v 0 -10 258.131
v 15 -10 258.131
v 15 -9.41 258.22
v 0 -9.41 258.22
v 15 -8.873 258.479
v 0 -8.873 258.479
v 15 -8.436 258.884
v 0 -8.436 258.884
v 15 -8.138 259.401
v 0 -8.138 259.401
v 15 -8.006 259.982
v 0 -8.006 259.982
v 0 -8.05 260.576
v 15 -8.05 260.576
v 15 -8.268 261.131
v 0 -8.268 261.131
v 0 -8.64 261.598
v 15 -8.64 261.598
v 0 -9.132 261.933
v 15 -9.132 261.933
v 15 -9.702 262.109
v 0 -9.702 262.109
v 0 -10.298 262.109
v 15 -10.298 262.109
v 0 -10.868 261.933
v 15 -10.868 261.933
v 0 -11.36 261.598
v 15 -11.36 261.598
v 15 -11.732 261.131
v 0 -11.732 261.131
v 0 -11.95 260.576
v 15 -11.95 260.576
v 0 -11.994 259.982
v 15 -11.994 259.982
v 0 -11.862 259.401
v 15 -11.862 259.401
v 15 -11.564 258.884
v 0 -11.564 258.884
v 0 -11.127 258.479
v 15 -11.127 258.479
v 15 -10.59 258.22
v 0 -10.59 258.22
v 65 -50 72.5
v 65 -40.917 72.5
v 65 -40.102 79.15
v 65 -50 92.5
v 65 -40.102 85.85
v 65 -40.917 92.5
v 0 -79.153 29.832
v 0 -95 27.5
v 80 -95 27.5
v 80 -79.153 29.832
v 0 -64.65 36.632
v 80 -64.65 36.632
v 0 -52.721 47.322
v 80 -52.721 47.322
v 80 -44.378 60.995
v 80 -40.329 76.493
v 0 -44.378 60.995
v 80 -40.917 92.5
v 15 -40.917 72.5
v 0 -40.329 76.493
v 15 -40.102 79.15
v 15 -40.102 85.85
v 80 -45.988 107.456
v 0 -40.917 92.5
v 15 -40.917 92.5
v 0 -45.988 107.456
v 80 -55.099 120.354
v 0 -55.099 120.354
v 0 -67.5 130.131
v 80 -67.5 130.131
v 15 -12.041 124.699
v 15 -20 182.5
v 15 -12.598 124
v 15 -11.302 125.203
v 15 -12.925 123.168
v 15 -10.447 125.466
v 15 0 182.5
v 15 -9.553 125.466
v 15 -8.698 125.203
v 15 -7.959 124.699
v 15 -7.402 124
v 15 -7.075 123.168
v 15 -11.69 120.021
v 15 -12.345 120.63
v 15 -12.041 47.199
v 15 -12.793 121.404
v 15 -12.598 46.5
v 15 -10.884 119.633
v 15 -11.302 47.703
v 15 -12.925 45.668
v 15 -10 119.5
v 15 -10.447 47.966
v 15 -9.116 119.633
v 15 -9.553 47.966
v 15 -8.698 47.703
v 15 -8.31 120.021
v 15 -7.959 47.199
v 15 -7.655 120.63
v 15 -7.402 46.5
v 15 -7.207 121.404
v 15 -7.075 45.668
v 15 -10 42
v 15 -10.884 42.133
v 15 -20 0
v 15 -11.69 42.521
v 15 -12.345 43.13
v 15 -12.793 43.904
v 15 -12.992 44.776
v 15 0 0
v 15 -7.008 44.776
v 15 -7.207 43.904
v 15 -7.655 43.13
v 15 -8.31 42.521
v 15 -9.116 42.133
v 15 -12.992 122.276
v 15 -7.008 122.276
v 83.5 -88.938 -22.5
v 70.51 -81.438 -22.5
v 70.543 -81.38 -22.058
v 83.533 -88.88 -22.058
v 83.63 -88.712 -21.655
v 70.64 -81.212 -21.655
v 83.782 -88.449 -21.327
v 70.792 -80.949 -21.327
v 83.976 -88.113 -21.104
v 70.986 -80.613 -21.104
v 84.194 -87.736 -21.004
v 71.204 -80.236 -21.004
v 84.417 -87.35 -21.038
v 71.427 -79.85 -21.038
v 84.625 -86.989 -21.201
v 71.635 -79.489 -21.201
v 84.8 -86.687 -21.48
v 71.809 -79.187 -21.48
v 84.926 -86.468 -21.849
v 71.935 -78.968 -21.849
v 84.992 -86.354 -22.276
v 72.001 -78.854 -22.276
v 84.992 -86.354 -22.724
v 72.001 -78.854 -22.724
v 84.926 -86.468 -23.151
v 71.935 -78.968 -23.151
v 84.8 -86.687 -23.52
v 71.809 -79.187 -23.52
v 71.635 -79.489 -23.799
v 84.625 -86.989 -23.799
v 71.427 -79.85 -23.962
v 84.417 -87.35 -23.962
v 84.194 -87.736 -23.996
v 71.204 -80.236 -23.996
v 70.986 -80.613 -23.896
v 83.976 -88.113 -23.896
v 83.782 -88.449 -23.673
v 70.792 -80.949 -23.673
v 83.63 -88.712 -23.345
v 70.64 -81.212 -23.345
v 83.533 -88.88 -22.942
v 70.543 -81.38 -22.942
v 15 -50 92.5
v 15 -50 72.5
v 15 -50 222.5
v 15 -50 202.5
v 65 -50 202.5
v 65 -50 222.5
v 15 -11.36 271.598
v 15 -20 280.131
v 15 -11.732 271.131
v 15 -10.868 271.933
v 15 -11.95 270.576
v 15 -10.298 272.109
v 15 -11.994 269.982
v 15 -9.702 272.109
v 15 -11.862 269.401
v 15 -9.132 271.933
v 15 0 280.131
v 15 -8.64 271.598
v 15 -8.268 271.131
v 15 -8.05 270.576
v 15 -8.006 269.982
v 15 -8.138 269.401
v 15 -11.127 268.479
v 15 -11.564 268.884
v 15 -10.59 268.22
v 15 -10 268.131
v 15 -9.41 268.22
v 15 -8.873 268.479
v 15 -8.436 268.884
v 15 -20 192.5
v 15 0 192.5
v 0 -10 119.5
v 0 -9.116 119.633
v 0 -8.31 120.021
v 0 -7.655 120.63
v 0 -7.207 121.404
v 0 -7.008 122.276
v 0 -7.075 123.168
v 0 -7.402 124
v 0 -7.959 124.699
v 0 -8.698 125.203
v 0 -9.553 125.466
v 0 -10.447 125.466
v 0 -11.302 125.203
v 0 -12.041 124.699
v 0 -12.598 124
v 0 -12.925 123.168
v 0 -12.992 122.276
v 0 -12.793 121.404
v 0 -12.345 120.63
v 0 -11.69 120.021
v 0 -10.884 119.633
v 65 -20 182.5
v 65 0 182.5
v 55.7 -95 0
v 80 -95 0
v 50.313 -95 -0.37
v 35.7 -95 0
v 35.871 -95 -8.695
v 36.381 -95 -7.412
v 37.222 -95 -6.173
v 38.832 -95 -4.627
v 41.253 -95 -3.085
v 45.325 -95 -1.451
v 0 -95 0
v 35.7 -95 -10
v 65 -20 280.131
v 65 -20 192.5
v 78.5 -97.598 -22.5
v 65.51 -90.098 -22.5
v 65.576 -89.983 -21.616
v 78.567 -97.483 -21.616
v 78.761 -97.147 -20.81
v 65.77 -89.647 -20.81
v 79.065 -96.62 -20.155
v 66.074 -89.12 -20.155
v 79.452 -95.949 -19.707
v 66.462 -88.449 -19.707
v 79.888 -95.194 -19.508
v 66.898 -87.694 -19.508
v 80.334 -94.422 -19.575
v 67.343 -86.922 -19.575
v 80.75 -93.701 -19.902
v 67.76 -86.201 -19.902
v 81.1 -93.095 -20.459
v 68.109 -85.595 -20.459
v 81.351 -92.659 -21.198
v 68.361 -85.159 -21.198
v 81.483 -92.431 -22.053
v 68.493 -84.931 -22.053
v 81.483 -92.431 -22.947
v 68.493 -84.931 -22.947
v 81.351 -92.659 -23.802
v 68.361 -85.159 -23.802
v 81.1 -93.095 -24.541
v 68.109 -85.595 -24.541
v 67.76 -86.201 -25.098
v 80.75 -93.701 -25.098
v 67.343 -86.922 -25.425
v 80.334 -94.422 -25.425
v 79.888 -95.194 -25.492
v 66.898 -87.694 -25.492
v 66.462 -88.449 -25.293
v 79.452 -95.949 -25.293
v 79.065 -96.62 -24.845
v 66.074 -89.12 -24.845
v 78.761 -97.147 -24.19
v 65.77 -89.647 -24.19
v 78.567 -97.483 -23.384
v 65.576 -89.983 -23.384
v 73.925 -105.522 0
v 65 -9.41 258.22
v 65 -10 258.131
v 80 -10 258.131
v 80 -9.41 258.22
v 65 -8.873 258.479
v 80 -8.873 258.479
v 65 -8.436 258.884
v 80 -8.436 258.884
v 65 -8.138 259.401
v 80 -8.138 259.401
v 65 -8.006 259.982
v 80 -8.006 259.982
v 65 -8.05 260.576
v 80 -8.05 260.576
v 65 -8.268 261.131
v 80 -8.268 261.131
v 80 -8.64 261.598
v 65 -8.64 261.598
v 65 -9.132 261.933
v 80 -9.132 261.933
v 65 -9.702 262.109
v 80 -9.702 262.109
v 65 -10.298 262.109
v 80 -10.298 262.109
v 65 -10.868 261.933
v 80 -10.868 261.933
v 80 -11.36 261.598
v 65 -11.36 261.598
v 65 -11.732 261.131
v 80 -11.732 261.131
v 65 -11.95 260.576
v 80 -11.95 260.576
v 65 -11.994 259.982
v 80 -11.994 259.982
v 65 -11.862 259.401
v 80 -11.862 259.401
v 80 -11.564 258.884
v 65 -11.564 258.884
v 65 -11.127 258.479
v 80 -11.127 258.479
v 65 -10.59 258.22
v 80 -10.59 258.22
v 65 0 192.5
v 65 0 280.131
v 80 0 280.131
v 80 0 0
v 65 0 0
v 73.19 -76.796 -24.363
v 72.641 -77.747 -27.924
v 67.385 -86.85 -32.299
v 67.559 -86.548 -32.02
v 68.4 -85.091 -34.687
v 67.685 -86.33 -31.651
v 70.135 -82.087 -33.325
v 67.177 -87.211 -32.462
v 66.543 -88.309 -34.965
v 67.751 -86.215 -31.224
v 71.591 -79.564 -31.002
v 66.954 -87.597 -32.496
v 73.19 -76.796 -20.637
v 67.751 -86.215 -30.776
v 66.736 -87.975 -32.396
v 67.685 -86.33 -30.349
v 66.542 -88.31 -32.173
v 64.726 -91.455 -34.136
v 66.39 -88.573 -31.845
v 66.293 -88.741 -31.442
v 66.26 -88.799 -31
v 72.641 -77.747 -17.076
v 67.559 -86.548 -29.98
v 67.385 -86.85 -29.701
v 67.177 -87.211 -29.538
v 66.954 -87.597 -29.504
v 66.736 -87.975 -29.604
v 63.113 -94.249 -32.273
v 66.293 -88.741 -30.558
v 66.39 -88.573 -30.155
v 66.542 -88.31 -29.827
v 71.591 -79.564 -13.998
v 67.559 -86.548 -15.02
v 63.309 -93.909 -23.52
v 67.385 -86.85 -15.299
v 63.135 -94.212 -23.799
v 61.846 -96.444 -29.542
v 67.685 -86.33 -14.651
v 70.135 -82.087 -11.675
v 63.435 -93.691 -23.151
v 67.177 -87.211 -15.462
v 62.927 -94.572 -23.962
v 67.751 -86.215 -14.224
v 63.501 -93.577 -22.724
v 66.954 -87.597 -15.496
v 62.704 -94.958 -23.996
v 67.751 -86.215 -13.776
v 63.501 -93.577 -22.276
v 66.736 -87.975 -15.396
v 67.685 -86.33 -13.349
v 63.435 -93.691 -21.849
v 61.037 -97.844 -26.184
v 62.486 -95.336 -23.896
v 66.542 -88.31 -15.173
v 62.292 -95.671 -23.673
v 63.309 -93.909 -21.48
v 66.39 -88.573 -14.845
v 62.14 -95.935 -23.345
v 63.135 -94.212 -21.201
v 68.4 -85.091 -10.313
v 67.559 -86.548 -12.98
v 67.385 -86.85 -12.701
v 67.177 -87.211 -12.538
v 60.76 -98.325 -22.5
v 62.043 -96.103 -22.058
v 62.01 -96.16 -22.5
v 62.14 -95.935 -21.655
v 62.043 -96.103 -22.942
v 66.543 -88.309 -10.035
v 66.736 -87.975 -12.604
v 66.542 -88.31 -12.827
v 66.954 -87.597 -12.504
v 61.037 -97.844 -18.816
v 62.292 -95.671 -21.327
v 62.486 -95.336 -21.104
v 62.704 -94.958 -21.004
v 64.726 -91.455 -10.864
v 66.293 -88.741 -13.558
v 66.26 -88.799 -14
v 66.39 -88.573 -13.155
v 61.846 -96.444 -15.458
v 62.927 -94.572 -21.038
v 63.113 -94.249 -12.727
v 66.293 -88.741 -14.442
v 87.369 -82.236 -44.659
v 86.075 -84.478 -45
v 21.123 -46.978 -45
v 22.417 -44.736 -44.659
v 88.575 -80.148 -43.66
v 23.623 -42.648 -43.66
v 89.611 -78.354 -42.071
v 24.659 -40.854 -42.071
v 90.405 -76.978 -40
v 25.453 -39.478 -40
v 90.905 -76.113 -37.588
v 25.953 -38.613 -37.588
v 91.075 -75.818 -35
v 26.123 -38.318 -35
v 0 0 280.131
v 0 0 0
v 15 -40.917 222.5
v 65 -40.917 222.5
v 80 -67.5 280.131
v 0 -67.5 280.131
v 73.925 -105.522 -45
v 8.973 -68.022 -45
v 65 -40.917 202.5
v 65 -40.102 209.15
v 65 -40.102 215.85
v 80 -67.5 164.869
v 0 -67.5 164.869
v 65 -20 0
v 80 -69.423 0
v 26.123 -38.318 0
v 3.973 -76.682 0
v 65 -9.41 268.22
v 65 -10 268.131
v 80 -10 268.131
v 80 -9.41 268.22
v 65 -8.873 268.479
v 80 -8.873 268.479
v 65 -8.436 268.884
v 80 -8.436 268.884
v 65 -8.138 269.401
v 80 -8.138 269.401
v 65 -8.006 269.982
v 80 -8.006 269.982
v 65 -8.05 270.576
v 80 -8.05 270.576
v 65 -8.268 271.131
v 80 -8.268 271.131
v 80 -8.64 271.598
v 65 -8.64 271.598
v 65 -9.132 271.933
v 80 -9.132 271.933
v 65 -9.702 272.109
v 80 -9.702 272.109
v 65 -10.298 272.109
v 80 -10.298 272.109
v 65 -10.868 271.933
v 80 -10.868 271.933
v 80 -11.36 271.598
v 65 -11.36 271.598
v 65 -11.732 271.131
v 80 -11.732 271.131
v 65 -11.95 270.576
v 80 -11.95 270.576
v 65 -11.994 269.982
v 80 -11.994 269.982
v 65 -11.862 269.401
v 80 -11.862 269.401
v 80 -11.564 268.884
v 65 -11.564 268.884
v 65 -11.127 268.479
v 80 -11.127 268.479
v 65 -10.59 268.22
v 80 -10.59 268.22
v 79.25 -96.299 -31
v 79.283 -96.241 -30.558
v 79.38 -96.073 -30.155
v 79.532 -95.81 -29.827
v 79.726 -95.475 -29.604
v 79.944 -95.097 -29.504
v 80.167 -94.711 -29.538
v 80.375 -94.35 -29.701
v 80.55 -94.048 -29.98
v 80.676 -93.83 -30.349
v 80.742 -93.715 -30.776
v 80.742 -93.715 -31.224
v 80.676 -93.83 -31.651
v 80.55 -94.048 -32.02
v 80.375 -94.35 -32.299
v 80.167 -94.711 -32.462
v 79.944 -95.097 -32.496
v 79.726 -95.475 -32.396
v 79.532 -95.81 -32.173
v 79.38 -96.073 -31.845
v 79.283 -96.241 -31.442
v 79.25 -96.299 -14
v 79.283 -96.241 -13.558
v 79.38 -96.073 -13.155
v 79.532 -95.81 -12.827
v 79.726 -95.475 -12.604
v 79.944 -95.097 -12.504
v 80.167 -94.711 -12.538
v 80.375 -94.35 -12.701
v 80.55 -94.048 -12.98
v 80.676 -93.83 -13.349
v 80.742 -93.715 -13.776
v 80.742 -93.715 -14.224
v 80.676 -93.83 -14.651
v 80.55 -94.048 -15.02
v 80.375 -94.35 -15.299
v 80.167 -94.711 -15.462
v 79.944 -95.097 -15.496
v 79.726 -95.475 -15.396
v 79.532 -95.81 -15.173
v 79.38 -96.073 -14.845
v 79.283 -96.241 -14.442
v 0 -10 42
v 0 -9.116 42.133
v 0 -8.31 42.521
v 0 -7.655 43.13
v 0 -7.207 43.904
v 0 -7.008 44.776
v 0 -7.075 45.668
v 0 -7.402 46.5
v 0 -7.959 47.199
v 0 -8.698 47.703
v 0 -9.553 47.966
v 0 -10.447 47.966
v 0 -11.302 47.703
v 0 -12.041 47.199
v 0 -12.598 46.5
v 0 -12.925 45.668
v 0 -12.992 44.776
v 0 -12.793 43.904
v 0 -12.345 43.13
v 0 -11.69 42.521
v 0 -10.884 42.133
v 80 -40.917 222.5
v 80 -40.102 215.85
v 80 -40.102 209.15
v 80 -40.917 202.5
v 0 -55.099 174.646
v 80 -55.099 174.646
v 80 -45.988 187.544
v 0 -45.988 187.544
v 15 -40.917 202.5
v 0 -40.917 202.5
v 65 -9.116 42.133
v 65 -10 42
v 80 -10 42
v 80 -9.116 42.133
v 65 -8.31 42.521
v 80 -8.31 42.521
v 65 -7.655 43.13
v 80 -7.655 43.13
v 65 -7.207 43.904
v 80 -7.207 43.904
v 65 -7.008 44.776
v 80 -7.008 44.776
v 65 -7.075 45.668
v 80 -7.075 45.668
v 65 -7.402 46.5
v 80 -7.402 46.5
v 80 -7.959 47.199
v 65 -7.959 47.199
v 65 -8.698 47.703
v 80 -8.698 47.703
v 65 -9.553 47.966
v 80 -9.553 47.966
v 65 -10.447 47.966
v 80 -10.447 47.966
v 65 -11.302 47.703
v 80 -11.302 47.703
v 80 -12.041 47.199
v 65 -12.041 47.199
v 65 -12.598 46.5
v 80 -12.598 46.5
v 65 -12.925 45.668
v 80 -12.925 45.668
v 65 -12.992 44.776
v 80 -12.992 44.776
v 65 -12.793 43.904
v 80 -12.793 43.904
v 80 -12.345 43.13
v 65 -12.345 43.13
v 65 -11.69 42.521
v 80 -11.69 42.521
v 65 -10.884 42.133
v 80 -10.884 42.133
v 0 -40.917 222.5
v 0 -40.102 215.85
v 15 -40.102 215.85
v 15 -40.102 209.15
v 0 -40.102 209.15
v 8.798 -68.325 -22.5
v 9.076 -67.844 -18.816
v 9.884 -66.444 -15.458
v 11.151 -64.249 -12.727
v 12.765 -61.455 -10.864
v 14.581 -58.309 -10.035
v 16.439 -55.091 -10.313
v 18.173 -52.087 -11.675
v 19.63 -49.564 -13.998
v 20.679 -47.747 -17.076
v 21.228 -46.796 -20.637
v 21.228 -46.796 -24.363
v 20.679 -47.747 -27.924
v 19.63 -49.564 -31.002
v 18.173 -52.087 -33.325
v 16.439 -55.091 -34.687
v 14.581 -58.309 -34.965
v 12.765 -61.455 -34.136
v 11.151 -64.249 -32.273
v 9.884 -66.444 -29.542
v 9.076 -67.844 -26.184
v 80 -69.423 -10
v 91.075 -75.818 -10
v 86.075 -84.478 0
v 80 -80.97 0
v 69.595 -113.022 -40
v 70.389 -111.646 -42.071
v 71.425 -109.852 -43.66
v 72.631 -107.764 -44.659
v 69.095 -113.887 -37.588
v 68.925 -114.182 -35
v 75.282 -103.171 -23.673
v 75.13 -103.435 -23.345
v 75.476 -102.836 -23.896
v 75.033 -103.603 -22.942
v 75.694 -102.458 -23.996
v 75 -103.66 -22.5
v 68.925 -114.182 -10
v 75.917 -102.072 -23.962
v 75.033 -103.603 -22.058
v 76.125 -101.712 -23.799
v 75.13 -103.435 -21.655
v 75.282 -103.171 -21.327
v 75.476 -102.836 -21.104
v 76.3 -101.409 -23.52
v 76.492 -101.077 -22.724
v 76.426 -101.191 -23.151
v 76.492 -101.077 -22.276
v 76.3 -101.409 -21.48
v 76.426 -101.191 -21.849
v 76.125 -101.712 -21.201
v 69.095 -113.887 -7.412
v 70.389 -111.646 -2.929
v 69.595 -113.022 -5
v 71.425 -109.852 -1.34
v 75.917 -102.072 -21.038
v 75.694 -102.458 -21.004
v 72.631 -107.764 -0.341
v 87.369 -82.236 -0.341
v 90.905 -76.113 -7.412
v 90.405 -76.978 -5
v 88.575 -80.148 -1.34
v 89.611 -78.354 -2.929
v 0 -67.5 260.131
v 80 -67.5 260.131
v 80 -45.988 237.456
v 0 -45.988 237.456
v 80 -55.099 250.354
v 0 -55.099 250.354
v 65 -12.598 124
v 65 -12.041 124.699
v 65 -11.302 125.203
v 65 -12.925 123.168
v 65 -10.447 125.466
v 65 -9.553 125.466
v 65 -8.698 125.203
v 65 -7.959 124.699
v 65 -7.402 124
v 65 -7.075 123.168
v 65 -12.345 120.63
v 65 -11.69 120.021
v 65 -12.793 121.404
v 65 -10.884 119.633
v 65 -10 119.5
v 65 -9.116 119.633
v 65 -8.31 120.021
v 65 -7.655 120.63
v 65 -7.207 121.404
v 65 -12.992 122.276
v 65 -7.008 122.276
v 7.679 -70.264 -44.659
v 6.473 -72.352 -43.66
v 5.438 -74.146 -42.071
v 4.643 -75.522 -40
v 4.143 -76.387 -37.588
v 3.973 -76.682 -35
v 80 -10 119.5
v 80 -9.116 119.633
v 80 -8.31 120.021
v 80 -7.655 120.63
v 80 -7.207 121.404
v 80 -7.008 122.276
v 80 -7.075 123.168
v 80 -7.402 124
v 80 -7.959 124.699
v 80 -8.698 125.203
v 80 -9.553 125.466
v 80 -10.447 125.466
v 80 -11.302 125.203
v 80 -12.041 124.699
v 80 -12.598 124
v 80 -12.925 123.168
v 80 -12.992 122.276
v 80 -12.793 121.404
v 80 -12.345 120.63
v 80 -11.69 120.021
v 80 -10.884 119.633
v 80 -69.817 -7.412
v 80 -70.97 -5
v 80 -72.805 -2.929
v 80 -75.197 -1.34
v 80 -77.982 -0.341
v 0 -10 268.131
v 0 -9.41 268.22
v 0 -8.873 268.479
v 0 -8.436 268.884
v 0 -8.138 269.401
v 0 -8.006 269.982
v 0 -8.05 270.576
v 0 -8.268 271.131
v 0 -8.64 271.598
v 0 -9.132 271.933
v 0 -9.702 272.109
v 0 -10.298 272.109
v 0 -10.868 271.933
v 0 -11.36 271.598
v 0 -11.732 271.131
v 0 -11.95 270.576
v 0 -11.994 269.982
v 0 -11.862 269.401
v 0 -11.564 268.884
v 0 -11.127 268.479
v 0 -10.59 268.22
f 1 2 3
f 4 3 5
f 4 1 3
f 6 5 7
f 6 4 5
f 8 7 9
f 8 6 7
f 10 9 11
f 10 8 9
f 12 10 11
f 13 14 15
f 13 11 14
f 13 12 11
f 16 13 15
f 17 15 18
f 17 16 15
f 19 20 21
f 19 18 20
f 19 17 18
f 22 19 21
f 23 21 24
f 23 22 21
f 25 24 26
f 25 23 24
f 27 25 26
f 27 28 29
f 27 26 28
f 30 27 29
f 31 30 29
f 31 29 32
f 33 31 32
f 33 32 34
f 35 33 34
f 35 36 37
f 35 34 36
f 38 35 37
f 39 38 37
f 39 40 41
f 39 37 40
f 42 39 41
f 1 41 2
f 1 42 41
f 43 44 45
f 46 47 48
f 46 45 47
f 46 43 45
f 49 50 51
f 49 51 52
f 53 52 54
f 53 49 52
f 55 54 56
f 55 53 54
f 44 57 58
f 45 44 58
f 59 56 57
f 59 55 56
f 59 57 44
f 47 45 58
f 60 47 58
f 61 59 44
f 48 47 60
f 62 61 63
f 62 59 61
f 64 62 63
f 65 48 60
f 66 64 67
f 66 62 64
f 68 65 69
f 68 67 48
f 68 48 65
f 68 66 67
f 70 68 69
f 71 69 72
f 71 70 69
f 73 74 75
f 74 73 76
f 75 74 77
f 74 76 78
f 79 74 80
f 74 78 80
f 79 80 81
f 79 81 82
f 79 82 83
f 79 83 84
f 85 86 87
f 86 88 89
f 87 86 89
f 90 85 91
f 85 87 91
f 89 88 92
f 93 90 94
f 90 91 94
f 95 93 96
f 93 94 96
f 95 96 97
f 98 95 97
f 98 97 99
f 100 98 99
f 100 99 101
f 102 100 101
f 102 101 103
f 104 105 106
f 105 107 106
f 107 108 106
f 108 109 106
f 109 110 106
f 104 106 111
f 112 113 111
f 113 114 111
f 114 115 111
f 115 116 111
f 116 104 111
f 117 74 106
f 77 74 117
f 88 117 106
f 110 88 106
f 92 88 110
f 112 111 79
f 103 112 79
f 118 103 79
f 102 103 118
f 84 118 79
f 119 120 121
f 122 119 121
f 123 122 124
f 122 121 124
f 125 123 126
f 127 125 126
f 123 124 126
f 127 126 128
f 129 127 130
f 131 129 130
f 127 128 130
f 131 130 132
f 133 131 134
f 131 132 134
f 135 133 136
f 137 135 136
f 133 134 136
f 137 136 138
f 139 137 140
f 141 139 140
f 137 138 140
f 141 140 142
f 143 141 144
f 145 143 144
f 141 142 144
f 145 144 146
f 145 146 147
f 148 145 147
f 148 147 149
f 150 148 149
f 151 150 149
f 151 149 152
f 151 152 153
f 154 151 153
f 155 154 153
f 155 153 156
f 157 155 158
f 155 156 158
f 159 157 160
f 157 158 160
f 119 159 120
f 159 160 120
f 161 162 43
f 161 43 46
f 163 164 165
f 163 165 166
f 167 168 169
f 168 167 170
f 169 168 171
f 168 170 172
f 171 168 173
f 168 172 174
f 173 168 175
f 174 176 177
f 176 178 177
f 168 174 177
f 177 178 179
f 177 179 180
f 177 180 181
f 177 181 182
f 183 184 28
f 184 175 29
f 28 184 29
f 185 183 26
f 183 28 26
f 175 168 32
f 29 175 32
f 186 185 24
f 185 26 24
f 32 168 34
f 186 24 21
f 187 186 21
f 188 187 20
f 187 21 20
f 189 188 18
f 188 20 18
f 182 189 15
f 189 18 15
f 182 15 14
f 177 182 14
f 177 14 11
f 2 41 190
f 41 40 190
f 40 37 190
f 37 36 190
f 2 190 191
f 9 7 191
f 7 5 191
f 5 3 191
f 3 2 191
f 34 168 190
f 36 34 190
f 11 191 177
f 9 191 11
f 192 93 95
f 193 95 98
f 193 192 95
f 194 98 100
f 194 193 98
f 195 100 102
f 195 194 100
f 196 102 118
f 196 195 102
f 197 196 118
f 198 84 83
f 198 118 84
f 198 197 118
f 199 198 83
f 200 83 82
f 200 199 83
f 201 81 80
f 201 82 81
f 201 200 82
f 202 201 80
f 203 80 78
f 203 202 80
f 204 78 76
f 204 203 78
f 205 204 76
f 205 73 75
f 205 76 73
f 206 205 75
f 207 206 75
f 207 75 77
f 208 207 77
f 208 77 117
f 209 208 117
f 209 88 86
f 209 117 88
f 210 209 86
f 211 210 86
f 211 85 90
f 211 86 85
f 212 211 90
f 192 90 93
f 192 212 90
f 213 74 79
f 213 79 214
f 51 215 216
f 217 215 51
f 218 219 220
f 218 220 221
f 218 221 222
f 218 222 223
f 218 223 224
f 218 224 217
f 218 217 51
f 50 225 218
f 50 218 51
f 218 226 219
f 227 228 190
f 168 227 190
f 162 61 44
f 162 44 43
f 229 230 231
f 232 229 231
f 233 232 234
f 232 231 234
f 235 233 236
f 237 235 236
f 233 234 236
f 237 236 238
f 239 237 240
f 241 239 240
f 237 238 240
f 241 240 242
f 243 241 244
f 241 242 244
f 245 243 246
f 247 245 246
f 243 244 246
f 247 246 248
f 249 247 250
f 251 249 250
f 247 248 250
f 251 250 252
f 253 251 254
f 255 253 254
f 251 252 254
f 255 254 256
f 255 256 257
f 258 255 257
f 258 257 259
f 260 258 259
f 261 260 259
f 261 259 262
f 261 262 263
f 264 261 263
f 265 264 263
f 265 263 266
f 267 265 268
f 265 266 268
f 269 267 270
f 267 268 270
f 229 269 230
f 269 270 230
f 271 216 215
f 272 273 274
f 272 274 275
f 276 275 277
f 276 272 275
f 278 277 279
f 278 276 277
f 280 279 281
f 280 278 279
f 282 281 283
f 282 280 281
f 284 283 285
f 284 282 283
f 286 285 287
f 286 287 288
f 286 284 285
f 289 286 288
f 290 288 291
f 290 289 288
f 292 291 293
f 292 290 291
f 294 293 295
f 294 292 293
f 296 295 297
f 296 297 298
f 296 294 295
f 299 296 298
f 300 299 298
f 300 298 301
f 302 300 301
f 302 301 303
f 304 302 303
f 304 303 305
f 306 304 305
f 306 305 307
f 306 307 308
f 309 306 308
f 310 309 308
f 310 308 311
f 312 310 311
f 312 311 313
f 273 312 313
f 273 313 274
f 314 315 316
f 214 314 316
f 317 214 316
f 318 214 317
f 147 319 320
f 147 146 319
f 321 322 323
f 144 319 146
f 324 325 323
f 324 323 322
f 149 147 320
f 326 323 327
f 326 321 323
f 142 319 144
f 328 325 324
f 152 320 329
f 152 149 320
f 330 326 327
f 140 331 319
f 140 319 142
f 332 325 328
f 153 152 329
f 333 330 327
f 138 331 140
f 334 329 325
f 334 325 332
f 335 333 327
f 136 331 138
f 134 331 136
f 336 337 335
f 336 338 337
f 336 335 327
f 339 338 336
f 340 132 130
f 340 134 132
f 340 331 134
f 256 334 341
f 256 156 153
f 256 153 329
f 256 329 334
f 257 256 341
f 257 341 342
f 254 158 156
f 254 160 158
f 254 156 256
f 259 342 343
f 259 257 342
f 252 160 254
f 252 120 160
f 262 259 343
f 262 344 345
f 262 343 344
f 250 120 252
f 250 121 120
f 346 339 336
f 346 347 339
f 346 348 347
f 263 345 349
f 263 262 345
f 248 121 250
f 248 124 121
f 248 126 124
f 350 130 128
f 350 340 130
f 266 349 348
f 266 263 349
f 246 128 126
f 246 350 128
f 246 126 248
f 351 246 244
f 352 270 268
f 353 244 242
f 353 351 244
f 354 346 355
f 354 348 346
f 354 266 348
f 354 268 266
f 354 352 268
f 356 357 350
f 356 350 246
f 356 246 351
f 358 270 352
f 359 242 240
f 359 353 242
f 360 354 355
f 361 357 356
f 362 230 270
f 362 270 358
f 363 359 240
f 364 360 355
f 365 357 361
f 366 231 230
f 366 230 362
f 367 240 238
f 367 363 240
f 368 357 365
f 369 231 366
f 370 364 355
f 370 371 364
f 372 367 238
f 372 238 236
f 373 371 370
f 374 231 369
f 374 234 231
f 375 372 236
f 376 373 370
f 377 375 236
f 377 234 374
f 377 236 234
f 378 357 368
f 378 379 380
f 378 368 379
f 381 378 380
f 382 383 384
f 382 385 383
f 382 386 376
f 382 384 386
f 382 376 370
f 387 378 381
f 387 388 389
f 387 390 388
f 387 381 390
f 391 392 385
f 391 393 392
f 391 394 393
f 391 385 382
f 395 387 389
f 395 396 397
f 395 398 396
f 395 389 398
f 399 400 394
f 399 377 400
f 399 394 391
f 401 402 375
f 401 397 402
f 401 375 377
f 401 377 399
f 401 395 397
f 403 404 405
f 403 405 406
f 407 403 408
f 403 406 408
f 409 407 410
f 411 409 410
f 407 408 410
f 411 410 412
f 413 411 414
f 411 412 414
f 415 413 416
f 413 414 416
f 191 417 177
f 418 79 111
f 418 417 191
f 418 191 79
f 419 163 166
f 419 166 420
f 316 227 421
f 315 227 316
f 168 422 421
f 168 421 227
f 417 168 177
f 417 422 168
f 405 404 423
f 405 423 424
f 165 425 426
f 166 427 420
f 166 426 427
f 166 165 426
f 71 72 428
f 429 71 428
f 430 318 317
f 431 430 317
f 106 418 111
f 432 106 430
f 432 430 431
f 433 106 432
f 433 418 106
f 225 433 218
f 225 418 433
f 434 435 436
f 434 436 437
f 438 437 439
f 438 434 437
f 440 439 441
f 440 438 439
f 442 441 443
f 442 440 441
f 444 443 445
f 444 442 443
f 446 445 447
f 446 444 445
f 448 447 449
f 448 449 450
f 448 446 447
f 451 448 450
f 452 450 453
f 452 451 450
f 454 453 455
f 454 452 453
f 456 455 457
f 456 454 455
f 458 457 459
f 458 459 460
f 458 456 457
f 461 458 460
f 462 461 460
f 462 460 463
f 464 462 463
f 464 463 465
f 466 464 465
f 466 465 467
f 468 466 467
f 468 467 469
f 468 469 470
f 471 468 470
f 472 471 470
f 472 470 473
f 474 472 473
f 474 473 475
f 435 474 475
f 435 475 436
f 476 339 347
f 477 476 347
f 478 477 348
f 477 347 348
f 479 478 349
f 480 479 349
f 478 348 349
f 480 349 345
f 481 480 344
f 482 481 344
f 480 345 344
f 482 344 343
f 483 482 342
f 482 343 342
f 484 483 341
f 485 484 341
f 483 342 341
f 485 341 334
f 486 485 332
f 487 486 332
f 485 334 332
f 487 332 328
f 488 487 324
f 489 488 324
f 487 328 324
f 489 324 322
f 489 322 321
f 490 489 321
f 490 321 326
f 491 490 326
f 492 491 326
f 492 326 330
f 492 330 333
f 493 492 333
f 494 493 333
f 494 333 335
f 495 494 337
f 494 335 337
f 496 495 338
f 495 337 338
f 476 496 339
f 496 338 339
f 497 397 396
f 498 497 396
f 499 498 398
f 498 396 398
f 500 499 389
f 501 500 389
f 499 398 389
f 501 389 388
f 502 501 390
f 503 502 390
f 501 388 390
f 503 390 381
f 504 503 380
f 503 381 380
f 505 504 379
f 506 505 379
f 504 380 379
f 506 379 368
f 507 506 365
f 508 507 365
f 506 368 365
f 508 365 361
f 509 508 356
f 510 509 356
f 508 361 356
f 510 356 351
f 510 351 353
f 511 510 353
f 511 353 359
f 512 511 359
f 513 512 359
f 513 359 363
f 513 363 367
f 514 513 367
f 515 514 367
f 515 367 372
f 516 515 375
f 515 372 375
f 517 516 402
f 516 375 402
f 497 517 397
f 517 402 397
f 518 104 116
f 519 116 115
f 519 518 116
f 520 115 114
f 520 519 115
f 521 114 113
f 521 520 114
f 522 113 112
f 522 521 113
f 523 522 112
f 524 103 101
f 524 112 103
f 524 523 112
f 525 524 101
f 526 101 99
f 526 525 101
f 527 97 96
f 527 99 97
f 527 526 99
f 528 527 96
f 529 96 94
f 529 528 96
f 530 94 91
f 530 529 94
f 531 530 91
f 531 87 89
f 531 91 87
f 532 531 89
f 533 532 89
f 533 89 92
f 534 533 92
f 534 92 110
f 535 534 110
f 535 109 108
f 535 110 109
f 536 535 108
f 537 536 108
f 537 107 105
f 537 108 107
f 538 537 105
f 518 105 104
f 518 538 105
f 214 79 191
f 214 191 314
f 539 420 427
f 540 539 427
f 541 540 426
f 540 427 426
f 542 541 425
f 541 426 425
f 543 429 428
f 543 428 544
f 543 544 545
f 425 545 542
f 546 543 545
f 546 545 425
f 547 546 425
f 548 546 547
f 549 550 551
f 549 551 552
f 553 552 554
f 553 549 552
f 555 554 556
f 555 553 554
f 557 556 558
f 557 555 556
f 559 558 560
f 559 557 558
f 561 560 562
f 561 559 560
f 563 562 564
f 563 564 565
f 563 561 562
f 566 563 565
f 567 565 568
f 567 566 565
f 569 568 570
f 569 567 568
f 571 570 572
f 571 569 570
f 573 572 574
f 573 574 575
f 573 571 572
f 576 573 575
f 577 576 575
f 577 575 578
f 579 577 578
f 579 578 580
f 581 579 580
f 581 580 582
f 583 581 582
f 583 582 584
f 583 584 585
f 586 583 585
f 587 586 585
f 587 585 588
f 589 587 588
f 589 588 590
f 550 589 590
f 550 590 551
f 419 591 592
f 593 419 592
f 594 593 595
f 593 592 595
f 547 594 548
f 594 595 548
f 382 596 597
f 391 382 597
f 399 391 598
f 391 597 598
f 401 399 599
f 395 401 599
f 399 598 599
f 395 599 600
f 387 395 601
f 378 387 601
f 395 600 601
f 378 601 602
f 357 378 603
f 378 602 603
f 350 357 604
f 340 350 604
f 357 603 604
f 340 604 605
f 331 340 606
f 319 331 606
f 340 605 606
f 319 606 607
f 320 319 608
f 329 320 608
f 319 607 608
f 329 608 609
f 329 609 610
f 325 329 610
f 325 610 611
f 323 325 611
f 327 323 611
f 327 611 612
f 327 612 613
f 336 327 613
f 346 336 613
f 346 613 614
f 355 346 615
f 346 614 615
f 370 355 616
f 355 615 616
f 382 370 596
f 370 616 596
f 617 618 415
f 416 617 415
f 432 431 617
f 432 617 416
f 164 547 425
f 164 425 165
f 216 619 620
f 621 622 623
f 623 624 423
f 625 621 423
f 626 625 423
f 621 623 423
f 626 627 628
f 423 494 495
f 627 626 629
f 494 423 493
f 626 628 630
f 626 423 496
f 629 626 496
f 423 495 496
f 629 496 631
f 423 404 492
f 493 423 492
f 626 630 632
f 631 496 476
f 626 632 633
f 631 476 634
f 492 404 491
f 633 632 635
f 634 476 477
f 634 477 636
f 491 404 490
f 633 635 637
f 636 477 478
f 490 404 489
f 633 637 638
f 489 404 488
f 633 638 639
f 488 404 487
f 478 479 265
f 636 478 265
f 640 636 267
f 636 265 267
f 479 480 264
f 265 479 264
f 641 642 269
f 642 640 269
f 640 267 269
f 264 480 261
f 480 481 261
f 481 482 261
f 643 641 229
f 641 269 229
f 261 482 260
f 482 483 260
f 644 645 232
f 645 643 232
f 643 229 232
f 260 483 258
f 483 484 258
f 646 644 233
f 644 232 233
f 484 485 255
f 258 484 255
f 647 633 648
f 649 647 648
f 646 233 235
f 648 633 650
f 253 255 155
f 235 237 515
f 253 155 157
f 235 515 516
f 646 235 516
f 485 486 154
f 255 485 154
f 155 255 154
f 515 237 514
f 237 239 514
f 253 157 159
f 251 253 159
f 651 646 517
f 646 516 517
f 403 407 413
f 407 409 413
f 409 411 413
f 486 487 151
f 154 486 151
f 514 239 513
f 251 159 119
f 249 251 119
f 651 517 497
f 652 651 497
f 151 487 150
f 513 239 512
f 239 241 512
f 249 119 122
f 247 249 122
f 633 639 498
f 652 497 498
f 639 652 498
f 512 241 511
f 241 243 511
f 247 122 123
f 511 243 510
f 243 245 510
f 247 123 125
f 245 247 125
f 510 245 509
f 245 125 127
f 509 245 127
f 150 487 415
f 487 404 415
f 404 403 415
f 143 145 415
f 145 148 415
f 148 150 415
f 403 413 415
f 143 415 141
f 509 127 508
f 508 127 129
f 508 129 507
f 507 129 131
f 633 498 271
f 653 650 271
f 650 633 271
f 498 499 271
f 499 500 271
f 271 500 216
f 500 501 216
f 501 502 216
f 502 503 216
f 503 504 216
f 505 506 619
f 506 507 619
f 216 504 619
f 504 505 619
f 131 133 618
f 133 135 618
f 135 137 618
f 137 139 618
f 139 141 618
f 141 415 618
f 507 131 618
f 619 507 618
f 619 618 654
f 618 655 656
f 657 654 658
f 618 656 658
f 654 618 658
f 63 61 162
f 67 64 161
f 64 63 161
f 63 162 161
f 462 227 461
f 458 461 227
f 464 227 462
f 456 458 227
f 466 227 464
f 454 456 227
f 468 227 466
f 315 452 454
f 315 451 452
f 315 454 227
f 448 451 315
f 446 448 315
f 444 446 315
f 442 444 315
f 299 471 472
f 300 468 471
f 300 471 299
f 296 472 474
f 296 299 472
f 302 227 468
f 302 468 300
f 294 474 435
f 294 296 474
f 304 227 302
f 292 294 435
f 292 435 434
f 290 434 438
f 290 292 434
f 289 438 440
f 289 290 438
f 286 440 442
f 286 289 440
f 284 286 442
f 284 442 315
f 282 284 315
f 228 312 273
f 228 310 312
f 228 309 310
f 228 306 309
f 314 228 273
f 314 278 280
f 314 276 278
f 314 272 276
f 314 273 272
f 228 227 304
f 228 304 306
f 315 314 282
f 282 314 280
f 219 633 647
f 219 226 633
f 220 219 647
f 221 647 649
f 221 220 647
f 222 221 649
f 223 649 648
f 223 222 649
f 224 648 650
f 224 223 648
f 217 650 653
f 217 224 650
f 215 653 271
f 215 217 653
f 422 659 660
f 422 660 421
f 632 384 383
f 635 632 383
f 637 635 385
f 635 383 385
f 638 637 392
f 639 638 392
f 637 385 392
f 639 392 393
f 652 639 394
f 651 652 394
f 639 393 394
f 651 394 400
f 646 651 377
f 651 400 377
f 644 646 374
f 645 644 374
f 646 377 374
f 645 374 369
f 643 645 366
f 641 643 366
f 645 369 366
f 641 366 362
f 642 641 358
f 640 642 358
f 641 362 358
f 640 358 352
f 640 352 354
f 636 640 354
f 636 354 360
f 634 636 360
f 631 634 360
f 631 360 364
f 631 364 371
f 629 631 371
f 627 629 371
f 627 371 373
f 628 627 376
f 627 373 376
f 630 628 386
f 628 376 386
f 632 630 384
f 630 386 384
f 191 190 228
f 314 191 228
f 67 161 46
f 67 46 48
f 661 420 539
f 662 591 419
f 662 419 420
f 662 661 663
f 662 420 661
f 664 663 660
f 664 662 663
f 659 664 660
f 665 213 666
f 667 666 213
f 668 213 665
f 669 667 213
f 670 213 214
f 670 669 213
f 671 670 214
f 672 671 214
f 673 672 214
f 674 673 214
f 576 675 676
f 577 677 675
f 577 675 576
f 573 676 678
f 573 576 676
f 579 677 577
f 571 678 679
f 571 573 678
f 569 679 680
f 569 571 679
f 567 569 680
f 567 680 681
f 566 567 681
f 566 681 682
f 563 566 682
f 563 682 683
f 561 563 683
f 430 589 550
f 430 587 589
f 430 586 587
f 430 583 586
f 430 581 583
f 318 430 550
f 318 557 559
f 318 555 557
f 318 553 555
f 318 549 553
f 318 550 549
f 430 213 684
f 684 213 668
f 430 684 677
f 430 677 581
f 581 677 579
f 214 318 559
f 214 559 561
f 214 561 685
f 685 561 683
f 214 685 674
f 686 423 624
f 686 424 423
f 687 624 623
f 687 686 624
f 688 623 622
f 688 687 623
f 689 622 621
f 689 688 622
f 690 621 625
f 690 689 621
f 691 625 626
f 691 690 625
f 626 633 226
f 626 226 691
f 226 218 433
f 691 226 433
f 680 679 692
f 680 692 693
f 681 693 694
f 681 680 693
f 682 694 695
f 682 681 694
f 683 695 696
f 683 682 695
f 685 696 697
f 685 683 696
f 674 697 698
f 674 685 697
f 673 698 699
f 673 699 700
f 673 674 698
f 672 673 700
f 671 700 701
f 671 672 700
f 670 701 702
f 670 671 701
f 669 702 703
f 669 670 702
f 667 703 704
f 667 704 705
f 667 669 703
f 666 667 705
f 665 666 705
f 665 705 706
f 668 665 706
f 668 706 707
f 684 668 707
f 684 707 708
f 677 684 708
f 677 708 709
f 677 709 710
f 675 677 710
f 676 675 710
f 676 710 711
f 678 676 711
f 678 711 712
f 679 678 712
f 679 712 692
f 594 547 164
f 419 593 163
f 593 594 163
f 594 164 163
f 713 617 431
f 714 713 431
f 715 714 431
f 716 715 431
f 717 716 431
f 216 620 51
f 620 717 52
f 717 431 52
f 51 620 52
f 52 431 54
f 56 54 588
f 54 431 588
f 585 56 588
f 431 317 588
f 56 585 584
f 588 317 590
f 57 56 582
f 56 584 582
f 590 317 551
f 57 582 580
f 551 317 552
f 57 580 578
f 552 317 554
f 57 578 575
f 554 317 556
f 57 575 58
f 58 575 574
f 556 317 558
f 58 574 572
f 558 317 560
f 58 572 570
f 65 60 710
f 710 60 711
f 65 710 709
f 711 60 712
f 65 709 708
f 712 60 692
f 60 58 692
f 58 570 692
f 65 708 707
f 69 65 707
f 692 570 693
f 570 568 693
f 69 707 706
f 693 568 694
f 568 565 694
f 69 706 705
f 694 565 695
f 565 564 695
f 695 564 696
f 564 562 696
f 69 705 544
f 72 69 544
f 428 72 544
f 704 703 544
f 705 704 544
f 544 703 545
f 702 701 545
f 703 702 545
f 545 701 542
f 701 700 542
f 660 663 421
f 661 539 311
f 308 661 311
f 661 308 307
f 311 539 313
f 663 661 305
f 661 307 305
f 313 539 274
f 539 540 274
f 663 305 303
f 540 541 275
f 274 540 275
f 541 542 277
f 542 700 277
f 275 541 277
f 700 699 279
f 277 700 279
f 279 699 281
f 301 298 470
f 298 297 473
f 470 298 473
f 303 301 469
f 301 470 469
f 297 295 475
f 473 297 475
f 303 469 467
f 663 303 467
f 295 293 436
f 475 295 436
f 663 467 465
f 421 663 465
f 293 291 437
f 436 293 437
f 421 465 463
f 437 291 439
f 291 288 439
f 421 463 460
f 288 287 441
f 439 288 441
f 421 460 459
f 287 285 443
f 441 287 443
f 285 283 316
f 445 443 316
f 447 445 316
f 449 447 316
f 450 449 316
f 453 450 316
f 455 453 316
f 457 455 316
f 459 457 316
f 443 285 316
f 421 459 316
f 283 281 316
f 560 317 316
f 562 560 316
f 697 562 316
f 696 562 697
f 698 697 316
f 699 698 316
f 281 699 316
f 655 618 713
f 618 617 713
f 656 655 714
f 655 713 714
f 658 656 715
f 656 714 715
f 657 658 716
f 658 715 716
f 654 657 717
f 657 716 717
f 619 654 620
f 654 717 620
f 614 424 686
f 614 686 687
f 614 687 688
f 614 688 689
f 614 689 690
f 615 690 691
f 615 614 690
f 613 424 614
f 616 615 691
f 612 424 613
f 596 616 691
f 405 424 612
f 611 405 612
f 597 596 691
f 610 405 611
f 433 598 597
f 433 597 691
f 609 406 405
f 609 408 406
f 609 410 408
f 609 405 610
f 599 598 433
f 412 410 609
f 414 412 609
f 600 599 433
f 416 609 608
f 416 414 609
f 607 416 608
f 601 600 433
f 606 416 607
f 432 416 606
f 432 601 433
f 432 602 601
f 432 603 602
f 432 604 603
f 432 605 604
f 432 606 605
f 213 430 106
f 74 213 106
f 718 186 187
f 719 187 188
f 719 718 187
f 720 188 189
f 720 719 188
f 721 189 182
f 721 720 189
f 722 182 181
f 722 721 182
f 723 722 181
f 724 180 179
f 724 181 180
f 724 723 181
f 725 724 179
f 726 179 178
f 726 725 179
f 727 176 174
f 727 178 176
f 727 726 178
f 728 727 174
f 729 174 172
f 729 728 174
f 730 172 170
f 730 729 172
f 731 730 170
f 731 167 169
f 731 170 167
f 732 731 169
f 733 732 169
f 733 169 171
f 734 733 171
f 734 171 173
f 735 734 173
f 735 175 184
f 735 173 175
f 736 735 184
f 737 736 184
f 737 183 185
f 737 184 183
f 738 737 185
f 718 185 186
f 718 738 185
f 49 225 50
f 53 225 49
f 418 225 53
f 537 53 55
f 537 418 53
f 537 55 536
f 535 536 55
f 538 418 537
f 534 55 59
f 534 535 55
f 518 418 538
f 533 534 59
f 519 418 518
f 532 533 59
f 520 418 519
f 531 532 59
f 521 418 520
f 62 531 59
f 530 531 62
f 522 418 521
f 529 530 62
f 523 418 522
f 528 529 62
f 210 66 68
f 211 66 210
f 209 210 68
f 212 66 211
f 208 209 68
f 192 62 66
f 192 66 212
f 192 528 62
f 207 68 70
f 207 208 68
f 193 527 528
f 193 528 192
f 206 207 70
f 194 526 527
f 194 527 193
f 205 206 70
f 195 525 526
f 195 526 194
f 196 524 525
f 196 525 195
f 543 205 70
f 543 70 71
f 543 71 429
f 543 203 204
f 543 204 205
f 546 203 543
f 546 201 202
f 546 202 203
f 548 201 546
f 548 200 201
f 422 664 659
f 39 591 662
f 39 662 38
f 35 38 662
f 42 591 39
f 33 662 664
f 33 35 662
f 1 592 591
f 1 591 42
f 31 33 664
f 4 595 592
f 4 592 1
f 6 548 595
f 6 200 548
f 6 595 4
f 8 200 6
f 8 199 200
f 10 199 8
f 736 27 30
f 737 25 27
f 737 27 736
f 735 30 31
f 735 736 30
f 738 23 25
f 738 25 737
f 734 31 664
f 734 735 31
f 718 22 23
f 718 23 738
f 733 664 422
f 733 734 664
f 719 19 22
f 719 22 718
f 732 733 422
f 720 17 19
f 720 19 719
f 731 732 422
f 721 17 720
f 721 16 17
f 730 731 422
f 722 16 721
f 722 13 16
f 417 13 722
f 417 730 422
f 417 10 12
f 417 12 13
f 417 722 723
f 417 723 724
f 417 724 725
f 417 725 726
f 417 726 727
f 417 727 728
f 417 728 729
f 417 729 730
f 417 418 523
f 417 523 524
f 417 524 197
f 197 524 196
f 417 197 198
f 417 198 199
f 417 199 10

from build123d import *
from build123d.topology import SkipClean

# Parameters (mm, degrees)
SKETCH_1_R               = 3
SKETCH_1_R_2             = 2
EXTRUDE_1_DEPTH          = 80
CUT_EXTRUDE_4_REACH      = 297.59
CUT_EXTRUDE_4_END_RADIUS = 55
SKETCH_4_W               = 15
SKETCH_4_H               = 20
SKETCH_5_W               = 75
SKETCH_5_H               = 45
EXTRUDE_2_DEPTH          = 22.15
SKETCH_10_R              = 12.5
CUT_EXTRUDE_5_DEPTH      = 60
SKETCH_12_R              = 3
SKETCH_12_R_2            = 1.5
CUT_EXTRUDE_6_DEPTH      = 15
FILLET_1_R               = 10
SKETCH_13_W              = 50
SKETCH_13_H              = 20
CUT_EXTRUDE_7_DEPTH      = 280.131397208
CUT_EXTRUDE_8_REACH      = 303.476
CUT_EXTRUDE_8_END_RADIUS = 55
SKETCH_14_W              = 15
SKETCH_14_H              = 20
SKETCH_15_W              = 50
SKETCH_15_H              = 10
EXTRUDE_3_DEPTH          = 20


with BuildPart() as part:
    # Эскиз1 → Бобышка-Вытянуть1 (new body)
    with BuildSketch(Plane(origin=(0, 0, 0), x_dir=(0, 0, -1), z_dir=(1, 0, 0))):
        with BuildLine():
            Line((0, 0), (0, -95))
            Line((0, -95), (-27.5, -95))
            ThreePointArc((-27.5, -95), (-40.221163687, -59.821881801), (-72.5, -40.916730868))
            Line((-72.5, -40.916730868), (-72.5, -50))
            Line((-72.5, -50), (-92.5, -50))
            Line((-92.5, -50), (-92.5, -40.916730868))
            ThreePointArc((-92.5, -40.916730868), (-114.23345294, -50.077979069), (-130.131397208, -67.5))
            Line((-130.131397208, -67.5), (-164.868602792, -67.5))
            ThreePointArc((-164.868602792, -67.5), (-180.76654706, -50.077979069), (-202.5, -40.916730868))
            Line((-202.5, -40.916730868), (-202.5, -50))
            Line((-202.5, -50), (-222.5, -50))
            Line((-222.5, -50), (-222.5, -40.916730868))
            ThreePointArc((-222.5, -40.916730868), (-244.23345294, -50.077979069), (-260.131397208, -67.5))
            Line((-260.131397208, -67.5), (-280.131397208, -67.5))
            Line((-280.131397208, -67.5), (-280.131397208, 0))
            Line((-280.131397208, 0), (0, 0))
        make_face()
        with Locations((-45, -10)):
            Circle(SKETCH_1_R, mode=Mode.SUBTRACT)
        with Locations((-122.5, -10)):
            Circle(SKETCH_1_R, mode=Mode.SUBTRACT)
        with Locations((-270.131397208, -10)):
            Circle(SKETCH_1_R_2, mode=Mode.SUBTRACT)
        with Locations((-260.131397208, -10)):
            Circle(SKETCH_1_R_2, mode=Mode.SUBTRACT)
    extrude(amount=EXTRUDE_1_DEPTH)

    # Вырез-Вытянуть4: up to this cylinder (the profile starts inside it)
    with SkipClean():  # the faces are left unmerged after this step: merging them gives an invalid solid
        cut_extrude_4_end = Plane(origin=(40, -95, 82.5), z_dir=(-1, 0, 0)) * Cylinder(CUT_EXTRUDE_4_END_RADIUS, 771.18, mode=Mode.PRIVATE)
        # Эскиз4 → Вырез-Вытянуть4 (cut, up to the surface)
        with BuildSketch(Plane.XZ.offset(50), mode=Mode.PRIVATE) as cut_extrude_4_sk1:
            with Locations((7.5, 82.5)):
                Rectangle(SKETCH_4_W, SKETCH_4_H)
        cut_extrude_4_tool1 = extrude(cut_extrude_4_sk1.sketch, amount=-CUT_EXTRUDE_4_REACH, mode=Mode.PRIVATE) & cut_extrude_4_end
        add(cut_extrude_4_tool1.solids().sort_by_distance((7.5, -50, 82.5))[0], mode=Mode.SUBTRACT)
        # Эскиз4 → Вырез-Вытянуть4 (cut, up to the surface)
        with BuildSketch(Plane.XZ.offset(50), mode=Mode.PRIVATE) as cut_extrude_4_sk2:
            with Locations((72.5, 82.5)):
                Rectangle(SKETCH_4_W, SKETCH_4_H)
        cut_extrude_4_tool2 = extrude(cut_extrude_4_sk2.sketch, amount=-CUT_EXTRUDE_4_REACH, mode=Mode.PRIVATE) & cut_extrude_4_end
        add(cut_extrude_4_tool2.solids().sort_by_distance((72.5, -50, 82.5))[0], mode=Mode.SUBTRACT)

    # Эскиз5 → Бобышка-Вытянуть2 (add, symmetric)
    with SkipClean():  # the faces are left unmerged after this step: merging them gives an invalid solid
        with BuildSketch(Plane(origin=(-21.13620668, -36.608983849, 0), x_dir=(-0.8660254037844379, 0.5000000000000012, 0), z_dir=(0.5000000000000012, 0.8660254037844379, 0))):
            with Locations((-79.282032303, -22.5)):
                Rectangle(SKETCH_5_W, SKETCH_5_H)
        extrude(amount=EXTRUDE_2_DEPTH, both=True)

    # Эскиз10 → Вырез-Вытянуть5 (cut)
    with SkipClean():  # the faces are left unmerged after this step: merging them gives an invalid solid
        with BuildSketch(Plane(origin=(36.184301396, -20.891016151, 0), x_dir=(0, 0, 1), z_dir=(-0.866025403784438, 0.5000000000000012, 0))):
            with Locations(Location((-22.5, -42.27241336, 0), (0, 0, 270))):
                Circle(SKETCH_10_R)
        extrude(amount=-CUT_EXTRUDE_5_DEPTH, mode=Mode.SUBTRACT)

    # Эскиз12 → Вырез-Вытянуть6 (cut)
    with SkipClean():  # the faces are left unmerged after this step: merging them gives an invalid solid
        with BuildSketch(Plane(origin=(88.145825623, -50.891016151, 0), x_dir=(0, 0, 1), z_dir=(-0.866025403784438, 0.5000000000000012, 0))):
            with Locations(Location((-22.5, -42.27241336, 0), (0, 0, 270))):
                Circle(SKETCH_12_R)
            with Locations(Location((-22.5, -33.77241336, 0), (0, 0, 270))):
                Circle(SKETCH_12_R_2)
            with Locations(Location((-14, -42.27241336, 0), (0, 0, 270))):
                Circle(SKETCH_12_R_2)
            with Locations(Location((-22.5, -50.77241336, 0), (0, 0, 270))):
                Circle(SKETCH_12_R_2)
            with Locations(Location((-31, -42.27241336, 0), (0, 0, 270))):
                Circle(SKETCH_12_R_2)
        extrude(amount=-CUT_EXTRUDE_6_DEPTH, mode=Mode.SUBTRACT)

    # Скругление1
    fillet_1_edges = [part.edges().sort_by_distance(p)[0] for p in [
        (52.3125, -104.591231347, 0),
        (36.449047358, -95.432462694, -45),
        (58.599047358, -57.067537306, -45),
        (85.5375, -72.620460191, 0),
    ]]
    fillet(fillet_1_edges, radius=FILLET_1_R)

    # Эскиз13 → Вырез-Вытянуть7 (cut)
    with BuildSketch(Plane(origin=(0, 0, 0), x_dir=(-1, 0, 0), z_dir=(0, 0, -1))):
        with Locations((-40, -10)):
            Rectangle(SKETCH_13_W, SKETCH_13_H)
    extrude(amount=-CUT_EXTRUDE_7_DEPTH, mode=Mode.SUBTRACT)

    # Вырез-Вытянуть8: up to this cylinder (the profile starts inside it)
    with SkipClean():  # the faces are left unmerged after this step: merging them gives an invalid solid
        cut_extrude_8_end = Plane(origin=(40, -95, 212.5), z_dir=(-1, 0, 0)) * Cylinder(CUT_EXTRUDE_8_END_RADIUS, 782.952, mode=Mode.PRIVATE)
        # Эскиз14 → Вырез-Вытянуть8 (cut, up to the surface)
        with BuildSketch(Plane.XZ.offset(50), mode=Mode.PRIVATE) as cut_extrude_8_sk1:
            with Locations((7.5, 212.5)):
                Rectangle(SKETCH_14_W, SKETCH_14_H)
        cut_extrude_8_tool1 = extrude(cut_extrude_8_sk1.sketch, amount=-CUT_EXTRUDE_8_REACH, mode=Mode.PRIVATE) & cut_extrude_8_end
        add(cut_extrude_8_tool1.solids().sort_by_distance((7.5, -50, 212.5))[0], mode=Mode.SUBTRACT)
        # Эскиз14 → Вырез-Вытянуть8 (cut, up to the surface)
        with BuildSketch(Plane.XZ.offset(50), mode=Mode.PRIVATE) as cut_extrude_8_sk2:
            with Locations((72.5, 212.5)):
                Rectangle(SKETCH_14_W, SKETCH_14_H)
        cut_extrude_8_tool2 = extrude(cut_extrude_8_sk2.sketch, amount=-CUT_EXTRUDE_8_REACH, mode=Mode.PRIVATE) & cut_extrude_8_end
        add(cut_extrude_8_tool2.solids().sort_by_distance((72.5, -50, 212.5))[0], mode=Mode.SUBTRACT)

    # Эскиз15 → Бобышка-Вытянуть3 (add)
    with SkipClean():  # the faces are left unmerged after this step: merging them gives an invalid solid
        with BuildSketch(Plane(origin=(0, -20, 0), x_dir=(1, 0, 0), z_dir=(0, 1, 0))):
            with Locations((40, -187.5)):
                Rectangle(SKETCH_15_W, SKETCH_15_H)
        extrude(amount=EXTRUDE_3_DEPTH)


solid = part.part
